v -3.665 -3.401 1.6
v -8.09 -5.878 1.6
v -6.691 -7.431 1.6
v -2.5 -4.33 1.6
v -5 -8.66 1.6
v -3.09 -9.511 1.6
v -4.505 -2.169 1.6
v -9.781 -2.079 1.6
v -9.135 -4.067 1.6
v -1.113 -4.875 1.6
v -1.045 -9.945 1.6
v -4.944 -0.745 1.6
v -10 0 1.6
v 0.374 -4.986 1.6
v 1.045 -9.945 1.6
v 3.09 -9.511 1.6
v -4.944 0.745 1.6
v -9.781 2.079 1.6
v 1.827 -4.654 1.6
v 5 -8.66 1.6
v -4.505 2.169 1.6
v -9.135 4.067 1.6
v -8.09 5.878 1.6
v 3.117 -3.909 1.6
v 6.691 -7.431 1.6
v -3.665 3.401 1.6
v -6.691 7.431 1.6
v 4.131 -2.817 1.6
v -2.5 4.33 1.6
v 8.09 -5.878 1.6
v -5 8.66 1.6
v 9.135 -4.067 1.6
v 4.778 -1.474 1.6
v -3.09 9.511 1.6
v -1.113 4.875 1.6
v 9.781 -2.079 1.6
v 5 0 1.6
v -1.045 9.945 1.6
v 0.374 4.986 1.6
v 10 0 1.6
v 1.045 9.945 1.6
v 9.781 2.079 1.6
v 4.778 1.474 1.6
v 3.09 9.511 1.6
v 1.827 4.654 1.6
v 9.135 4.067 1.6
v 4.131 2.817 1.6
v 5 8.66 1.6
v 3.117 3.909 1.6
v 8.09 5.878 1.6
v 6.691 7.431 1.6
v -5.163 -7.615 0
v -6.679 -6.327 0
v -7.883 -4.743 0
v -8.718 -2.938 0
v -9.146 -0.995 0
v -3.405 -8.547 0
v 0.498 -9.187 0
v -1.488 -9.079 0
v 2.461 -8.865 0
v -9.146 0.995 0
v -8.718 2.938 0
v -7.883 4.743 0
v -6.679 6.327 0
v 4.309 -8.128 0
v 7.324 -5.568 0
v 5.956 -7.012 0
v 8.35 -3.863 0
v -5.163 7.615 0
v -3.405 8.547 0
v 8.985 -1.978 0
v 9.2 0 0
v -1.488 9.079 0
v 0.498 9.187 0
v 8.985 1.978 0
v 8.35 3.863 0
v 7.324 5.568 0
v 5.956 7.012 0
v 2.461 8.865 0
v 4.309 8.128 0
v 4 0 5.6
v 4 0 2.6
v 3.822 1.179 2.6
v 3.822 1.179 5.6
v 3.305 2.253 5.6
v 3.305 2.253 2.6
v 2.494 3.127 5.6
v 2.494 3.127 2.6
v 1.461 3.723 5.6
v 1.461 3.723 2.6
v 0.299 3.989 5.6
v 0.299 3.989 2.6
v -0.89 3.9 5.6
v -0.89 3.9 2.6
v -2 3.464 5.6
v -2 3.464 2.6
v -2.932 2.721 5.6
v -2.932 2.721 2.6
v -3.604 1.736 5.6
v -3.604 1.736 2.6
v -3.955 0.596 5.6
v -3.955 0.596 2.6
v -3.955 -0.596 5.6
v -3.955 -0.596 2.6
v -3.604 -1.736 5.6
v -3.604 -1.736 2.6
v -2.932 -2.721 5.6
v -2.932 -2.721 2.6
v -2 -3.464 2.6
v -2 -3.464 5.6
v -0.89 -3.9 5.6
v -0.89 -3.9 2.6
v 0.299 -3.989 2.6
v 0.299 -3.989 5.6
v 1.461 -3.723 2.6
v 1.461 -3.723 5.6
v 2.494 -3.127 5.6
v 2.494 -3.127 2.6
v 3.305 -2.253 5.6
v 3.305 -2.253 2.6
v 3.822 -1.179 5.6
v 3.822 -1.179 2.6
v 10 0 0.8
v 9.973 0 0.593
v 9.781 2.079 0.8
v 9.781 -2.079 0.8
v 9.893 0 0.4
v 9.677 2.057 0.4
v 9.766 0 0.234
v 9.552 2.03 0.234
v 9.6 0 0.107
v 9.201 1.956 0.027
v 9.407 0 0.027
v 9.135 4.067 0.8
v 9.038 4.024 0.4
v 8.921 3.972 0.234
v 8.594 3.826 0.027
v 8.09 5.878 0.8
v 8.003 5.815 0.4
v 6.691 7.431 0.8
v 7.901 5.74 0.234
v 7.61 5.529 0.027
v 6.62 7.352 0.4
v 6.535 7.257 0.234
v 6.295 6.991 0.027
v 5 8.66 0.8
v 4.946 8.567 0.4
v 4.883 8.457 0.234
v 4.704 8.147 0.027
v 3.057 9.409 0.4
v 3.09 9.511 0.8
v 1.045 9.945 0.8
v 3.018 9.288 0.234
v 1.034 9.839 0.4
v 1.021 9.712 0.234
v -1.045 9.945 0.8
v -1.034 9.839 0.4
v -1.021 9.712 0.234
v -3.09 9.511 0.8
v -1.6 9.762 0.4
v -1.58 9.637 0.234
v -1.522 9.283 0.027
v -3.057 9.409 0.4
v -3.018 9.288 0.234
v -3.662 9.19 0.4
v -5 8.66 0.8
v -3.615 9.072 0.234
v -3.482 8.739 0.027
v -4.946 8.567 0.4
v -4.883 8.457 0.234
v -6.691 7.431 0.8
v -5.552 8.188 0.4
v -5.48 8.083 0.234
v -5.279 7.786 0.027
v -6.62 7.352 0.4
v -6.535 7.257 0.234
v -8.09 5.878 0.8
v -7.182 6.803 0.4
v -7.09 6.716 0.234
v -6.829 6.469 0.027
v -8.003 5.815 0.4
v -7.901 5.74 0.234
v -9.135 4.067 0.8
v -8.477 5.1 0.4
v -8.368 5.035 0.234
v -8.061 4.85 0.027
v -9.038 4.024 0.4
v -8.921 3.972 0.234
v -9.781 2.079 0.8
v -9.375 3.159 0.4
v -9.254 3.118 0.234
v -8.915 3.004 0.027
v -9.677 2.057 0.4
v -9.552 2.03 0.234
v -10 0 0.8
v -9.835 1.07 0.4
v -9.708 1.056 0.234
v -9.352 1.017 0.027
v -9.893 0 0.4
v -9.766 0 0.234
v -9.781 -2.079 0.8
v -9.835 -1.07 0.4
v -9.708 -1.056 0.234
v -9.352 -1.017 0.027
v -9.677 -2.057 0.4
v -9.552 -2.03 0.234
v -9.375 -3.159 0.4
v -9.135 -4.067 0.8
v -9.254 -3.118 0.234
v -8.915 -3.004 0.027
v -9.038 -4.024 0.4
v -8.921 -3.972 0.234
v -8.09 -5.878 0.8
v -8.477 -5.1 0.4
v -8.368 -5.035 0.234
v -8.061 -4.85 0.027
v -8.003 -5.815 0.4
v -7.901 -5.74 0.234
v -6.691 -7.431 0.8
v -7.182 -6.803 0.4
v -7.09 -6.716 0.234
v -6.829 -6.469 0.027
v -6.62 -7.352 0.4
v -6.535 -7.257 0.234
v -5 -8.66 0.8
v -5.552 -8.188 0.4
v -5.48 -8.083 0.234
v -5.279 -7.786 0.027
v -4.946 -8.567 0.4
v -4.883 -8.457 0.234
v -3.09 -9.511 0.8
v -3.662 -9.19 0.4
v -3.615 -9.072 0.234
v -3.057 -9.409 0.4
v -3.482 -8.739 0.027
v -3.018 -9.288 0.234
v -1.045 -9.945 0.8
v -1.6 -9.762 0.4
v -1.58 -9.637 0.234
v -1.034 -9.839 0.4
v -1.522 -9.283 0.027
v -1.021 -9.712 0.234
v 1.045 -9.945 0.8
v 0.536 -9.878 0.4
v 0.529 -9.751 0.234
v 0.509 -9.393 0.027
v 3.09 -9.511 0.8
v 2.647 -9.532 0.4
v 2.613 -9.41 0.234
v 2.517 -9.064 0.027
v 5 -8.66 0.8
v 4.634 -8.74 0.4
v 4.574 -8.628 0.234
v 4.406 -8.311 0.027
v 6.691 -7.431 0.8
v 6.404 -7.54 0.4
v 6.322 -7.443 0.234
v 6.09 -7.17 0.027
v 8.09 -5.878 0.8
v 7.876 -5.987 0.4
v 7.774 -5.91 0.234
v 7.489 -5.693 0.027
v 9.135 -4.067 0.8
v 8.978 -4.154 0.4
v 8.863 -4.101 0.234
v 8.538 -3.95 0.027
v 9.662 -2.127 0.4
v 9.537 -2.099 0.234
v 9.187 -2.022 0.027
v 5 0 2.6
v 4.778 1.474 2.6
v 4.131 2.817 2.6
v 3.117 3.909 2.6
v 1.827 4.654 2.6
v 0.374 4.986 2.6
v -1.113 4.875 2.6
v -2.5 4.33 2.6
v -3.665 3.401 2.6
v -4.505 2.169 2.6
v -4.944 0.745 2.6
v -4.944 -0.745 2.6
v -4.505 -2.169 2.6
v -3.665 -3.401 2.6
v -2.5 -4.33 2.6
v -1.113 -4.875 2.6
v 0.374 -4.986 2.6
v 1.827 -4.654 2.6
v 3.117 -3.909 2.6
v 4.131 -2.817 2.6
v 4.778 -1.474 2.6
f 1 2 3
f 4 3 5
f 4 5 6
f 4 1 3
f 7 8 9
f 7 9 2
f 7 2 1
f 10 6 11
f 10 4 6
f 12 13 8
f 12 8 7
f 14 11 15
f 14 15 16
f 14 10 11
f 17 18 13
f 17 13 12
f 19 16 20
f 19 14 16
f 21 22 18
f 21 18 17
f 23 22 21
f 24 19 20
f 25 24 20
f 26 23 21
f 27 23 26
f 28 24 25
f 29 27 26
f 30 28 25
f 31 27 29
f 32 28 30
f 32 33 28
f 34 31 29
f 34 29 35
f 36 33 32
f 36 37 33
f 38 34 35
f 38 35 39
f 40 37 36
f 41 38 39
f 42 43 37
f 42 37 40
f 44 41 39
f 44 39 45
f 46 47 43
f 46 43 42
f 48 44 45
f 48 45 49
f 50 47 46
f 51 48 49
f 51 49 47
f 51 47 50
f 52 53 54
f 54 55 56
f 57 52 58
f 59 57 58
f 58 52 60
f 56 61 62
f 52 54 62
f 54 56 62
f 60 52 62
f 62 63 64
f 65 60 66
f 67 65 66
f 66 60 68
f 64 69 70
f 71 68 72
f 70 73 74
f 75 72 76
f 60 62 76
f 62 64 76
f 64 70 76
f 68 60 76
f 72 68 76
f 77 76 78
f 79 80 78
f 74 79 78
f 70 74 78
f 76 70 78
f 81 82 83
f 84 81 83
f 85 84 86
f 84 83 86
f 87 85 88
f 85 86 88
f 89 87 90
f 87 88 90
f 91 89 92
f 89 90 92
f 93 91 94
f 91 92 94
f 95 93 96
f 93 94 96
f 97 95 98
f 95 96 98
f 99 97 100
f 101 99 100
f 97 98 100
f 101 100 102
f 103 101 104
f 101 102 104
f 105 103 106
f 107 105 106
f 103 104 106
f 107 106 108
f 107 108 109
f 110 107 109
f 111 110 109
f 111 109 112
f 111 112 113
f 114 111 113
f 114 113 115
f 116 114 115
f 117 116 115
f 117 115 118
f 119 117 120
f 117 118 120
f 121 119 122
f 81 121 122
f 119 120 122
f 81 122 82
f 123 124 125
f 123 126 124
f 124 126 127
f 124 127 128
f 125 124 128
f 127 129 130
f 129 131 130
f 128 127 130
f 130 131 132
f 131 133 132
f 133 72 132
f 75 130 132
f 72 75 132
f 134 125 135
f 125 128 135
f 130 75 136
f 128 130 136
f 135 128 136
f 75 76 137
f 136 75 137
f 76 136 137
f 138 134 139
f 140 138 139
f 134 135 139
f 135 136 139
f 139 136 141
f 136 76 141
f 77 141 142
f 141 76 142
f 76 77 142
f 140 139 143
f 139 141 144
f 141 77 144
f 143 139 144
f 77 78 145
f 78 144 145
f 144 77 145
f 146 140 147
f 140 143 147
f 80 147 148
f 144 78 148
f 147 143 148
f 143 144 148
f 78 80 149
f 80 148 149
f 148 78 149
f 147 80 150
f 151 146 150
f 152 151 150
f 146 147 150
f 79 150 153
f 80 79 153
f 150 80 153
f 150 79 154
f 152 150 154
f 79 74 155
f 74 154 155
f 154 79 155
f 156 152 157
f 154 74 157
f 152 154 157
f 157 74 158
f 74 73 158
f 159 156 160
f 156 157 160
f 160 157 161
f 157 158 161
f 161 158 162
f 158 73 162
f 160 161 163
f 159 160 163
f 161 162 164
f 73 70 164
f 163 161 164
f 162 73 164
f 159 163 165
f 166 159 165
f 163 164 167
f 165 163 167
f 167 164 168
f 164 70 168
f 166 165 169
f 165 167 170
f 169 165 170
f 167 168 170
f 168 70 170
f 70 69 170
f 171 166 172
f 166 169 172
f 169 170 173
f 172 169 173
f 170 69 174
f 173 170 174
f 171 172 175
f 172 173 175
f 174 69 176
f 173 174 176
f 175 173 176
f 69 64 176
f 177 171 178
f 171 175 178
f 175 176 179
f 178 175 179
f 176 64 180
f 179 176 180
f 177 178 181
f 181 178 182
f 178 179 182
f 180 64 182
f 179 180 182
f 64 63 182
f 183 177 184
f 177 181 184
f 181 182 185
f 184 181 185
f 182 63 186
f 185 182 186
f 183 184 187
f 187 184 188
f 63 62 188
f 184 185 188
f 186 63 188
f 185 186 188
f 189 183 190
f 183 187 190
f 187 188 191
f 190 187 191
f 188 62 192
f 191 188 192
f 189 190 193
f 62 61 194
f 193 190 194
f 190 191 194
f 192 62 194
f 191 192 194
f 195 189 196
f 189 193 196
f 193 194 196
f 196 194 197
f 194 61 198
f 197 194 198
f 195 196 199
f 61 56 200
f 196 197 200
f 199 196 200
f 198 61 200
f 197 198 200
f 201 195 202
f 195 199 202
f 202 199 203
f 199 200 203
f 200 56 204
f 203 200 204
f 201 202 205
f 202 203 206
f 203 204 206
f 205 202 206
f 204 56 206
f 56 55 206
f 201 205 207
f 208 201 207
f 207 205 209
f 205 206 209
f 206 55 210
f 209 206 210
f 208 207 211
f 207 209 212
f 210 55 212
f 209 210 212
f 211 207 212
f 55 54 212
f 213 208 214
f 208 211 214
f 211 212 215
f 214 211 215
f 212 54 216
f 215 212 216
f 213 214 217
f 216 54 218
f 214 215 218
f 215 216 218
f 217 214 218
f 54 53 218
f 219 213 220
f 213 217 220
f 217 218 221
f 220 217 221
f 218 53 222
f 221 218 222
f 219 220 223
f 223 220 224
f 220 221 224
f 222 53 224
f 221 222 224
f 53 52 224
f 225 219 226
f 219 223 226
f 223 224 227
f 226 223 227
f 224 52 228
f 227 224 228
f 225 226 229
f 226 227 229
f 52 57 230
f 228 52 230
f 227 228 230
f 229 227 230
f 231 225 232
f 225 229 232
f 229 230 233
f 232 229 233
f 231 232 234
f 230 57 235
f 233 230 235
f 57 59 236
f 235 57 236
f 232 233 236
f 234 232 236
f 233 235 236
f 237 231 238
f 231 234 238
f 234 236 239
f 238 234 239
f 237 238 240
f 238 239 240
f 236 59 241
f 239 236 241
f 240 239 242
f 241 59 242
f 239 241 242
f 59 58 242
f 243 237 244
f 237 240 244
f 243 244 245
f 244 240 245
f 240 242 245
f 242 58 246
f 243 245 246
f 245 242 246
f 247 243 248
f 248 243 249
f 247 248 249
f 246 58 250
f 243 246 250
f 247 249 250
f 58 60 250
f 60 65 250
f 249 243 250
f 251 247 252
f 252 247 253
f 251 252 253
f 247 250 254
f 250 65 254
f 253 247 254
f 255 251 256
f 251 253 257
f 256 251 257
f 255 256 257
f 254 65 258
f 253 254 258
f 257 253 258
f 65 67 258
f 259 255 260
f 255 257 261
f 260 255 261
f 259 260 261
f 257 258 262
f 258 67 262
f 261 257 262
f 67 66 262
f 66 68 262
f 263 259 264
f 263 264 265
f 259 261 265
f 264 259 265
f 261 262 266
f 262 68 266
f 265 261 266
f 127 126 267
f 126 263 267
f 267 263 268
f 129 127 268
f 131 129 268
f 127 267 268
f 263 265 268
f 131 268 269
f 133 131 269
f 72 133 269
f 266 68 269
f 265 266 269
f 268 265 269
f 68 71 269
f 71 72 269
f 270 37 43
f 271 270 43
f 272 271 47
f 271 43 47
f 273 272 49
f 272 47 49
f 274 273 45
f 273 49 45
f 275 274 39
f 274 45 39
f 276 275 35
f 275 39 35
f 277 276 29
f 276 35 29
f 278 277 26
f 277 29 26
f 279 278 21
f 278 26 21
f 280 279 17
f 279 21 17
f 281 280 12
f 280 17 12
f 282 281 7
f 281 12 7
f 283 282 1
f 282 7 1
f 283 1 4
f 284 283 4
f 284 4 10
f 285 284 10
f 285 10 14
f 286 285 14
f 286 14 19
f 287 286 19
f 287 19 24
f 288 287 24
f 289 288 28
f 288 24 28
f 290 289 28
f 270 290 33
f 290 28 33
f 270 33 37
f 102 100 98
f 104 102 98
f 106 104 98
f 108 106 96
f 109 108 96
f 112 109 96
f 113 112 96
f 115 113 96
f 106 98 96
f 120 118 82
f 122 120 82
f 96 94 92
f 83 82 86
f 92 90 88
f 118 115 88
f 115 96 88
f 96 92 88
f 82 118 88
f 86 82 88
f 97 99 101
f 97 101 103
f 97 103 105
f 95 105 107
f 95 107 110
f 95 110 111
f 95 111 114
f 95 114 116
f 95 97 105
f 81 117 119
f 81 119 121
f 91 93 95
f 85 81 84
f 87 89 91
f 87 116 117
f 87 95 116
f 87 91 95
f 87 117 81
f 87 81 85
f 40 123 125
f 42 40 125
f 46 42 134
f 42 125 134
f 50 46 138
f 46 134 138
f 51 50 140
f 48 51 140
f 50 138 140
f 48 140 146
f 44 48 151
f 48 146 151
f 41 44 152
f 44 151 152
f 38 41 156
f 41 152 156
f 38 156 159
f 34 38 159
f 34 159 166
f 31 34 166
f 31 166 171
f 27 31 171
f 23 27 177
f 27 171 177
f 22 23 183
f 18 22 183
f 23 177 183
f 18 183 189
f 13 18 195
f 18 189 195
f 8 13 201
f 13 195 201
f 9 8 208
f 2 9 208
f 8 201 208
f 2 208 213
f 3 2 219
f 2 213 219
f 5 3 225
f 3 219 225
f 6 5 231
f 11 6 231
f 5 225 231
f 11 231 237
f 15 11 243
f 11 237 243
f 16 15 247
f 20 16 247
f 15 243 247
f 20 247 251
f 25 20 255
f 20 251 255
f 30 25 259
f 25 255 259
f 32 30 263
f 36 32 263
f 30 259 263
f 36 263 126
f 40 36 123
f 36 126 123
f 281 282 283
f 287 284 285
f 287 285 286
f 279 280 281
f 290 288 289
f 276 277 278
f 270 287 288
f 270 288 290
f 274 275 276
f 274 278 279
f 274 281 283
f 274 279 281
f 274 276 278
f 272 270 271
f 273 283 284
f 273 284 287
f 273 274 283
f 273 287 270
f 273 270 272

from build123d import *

# Parameters (mm, degrees)
F0_R     = 10
F1_DEPTH = 1.6
F2_R     = 5
F3_DEPTH = 1
F4_R     = 4
F5_DEPTH = 3
F6_R     = 0.8


with BuildPart() as f1:
    # F0 (on Top) → F1 (new body)
    with BuildSketch(Plane.XY):
        Circle(F0_R)
    extrude(amount=F1_DEPTH)

    # F2 (on face) → F3 (join)
    with BuildSketch(Plane.XY.offset(1.6)):
        Circle(F2_R)
    extrude(amount=F3_DEPTH)

    # F6
    f6_edges = [f1.edges().sort_by_distance(p)[0] for p in [
        (-10, 0, 0),
    ]]
    fillet(f6_edges, radius=F6_R)


with BuildPart() as f5:
    # F4 (on face) → F5 (new body)
    with BuildSketch(Plane.XY.offset(2.6)):
        Circle(F4_R)
    extrude(amount=F5_DEPTH)


solid = Compound([f1.part, f5.part])
